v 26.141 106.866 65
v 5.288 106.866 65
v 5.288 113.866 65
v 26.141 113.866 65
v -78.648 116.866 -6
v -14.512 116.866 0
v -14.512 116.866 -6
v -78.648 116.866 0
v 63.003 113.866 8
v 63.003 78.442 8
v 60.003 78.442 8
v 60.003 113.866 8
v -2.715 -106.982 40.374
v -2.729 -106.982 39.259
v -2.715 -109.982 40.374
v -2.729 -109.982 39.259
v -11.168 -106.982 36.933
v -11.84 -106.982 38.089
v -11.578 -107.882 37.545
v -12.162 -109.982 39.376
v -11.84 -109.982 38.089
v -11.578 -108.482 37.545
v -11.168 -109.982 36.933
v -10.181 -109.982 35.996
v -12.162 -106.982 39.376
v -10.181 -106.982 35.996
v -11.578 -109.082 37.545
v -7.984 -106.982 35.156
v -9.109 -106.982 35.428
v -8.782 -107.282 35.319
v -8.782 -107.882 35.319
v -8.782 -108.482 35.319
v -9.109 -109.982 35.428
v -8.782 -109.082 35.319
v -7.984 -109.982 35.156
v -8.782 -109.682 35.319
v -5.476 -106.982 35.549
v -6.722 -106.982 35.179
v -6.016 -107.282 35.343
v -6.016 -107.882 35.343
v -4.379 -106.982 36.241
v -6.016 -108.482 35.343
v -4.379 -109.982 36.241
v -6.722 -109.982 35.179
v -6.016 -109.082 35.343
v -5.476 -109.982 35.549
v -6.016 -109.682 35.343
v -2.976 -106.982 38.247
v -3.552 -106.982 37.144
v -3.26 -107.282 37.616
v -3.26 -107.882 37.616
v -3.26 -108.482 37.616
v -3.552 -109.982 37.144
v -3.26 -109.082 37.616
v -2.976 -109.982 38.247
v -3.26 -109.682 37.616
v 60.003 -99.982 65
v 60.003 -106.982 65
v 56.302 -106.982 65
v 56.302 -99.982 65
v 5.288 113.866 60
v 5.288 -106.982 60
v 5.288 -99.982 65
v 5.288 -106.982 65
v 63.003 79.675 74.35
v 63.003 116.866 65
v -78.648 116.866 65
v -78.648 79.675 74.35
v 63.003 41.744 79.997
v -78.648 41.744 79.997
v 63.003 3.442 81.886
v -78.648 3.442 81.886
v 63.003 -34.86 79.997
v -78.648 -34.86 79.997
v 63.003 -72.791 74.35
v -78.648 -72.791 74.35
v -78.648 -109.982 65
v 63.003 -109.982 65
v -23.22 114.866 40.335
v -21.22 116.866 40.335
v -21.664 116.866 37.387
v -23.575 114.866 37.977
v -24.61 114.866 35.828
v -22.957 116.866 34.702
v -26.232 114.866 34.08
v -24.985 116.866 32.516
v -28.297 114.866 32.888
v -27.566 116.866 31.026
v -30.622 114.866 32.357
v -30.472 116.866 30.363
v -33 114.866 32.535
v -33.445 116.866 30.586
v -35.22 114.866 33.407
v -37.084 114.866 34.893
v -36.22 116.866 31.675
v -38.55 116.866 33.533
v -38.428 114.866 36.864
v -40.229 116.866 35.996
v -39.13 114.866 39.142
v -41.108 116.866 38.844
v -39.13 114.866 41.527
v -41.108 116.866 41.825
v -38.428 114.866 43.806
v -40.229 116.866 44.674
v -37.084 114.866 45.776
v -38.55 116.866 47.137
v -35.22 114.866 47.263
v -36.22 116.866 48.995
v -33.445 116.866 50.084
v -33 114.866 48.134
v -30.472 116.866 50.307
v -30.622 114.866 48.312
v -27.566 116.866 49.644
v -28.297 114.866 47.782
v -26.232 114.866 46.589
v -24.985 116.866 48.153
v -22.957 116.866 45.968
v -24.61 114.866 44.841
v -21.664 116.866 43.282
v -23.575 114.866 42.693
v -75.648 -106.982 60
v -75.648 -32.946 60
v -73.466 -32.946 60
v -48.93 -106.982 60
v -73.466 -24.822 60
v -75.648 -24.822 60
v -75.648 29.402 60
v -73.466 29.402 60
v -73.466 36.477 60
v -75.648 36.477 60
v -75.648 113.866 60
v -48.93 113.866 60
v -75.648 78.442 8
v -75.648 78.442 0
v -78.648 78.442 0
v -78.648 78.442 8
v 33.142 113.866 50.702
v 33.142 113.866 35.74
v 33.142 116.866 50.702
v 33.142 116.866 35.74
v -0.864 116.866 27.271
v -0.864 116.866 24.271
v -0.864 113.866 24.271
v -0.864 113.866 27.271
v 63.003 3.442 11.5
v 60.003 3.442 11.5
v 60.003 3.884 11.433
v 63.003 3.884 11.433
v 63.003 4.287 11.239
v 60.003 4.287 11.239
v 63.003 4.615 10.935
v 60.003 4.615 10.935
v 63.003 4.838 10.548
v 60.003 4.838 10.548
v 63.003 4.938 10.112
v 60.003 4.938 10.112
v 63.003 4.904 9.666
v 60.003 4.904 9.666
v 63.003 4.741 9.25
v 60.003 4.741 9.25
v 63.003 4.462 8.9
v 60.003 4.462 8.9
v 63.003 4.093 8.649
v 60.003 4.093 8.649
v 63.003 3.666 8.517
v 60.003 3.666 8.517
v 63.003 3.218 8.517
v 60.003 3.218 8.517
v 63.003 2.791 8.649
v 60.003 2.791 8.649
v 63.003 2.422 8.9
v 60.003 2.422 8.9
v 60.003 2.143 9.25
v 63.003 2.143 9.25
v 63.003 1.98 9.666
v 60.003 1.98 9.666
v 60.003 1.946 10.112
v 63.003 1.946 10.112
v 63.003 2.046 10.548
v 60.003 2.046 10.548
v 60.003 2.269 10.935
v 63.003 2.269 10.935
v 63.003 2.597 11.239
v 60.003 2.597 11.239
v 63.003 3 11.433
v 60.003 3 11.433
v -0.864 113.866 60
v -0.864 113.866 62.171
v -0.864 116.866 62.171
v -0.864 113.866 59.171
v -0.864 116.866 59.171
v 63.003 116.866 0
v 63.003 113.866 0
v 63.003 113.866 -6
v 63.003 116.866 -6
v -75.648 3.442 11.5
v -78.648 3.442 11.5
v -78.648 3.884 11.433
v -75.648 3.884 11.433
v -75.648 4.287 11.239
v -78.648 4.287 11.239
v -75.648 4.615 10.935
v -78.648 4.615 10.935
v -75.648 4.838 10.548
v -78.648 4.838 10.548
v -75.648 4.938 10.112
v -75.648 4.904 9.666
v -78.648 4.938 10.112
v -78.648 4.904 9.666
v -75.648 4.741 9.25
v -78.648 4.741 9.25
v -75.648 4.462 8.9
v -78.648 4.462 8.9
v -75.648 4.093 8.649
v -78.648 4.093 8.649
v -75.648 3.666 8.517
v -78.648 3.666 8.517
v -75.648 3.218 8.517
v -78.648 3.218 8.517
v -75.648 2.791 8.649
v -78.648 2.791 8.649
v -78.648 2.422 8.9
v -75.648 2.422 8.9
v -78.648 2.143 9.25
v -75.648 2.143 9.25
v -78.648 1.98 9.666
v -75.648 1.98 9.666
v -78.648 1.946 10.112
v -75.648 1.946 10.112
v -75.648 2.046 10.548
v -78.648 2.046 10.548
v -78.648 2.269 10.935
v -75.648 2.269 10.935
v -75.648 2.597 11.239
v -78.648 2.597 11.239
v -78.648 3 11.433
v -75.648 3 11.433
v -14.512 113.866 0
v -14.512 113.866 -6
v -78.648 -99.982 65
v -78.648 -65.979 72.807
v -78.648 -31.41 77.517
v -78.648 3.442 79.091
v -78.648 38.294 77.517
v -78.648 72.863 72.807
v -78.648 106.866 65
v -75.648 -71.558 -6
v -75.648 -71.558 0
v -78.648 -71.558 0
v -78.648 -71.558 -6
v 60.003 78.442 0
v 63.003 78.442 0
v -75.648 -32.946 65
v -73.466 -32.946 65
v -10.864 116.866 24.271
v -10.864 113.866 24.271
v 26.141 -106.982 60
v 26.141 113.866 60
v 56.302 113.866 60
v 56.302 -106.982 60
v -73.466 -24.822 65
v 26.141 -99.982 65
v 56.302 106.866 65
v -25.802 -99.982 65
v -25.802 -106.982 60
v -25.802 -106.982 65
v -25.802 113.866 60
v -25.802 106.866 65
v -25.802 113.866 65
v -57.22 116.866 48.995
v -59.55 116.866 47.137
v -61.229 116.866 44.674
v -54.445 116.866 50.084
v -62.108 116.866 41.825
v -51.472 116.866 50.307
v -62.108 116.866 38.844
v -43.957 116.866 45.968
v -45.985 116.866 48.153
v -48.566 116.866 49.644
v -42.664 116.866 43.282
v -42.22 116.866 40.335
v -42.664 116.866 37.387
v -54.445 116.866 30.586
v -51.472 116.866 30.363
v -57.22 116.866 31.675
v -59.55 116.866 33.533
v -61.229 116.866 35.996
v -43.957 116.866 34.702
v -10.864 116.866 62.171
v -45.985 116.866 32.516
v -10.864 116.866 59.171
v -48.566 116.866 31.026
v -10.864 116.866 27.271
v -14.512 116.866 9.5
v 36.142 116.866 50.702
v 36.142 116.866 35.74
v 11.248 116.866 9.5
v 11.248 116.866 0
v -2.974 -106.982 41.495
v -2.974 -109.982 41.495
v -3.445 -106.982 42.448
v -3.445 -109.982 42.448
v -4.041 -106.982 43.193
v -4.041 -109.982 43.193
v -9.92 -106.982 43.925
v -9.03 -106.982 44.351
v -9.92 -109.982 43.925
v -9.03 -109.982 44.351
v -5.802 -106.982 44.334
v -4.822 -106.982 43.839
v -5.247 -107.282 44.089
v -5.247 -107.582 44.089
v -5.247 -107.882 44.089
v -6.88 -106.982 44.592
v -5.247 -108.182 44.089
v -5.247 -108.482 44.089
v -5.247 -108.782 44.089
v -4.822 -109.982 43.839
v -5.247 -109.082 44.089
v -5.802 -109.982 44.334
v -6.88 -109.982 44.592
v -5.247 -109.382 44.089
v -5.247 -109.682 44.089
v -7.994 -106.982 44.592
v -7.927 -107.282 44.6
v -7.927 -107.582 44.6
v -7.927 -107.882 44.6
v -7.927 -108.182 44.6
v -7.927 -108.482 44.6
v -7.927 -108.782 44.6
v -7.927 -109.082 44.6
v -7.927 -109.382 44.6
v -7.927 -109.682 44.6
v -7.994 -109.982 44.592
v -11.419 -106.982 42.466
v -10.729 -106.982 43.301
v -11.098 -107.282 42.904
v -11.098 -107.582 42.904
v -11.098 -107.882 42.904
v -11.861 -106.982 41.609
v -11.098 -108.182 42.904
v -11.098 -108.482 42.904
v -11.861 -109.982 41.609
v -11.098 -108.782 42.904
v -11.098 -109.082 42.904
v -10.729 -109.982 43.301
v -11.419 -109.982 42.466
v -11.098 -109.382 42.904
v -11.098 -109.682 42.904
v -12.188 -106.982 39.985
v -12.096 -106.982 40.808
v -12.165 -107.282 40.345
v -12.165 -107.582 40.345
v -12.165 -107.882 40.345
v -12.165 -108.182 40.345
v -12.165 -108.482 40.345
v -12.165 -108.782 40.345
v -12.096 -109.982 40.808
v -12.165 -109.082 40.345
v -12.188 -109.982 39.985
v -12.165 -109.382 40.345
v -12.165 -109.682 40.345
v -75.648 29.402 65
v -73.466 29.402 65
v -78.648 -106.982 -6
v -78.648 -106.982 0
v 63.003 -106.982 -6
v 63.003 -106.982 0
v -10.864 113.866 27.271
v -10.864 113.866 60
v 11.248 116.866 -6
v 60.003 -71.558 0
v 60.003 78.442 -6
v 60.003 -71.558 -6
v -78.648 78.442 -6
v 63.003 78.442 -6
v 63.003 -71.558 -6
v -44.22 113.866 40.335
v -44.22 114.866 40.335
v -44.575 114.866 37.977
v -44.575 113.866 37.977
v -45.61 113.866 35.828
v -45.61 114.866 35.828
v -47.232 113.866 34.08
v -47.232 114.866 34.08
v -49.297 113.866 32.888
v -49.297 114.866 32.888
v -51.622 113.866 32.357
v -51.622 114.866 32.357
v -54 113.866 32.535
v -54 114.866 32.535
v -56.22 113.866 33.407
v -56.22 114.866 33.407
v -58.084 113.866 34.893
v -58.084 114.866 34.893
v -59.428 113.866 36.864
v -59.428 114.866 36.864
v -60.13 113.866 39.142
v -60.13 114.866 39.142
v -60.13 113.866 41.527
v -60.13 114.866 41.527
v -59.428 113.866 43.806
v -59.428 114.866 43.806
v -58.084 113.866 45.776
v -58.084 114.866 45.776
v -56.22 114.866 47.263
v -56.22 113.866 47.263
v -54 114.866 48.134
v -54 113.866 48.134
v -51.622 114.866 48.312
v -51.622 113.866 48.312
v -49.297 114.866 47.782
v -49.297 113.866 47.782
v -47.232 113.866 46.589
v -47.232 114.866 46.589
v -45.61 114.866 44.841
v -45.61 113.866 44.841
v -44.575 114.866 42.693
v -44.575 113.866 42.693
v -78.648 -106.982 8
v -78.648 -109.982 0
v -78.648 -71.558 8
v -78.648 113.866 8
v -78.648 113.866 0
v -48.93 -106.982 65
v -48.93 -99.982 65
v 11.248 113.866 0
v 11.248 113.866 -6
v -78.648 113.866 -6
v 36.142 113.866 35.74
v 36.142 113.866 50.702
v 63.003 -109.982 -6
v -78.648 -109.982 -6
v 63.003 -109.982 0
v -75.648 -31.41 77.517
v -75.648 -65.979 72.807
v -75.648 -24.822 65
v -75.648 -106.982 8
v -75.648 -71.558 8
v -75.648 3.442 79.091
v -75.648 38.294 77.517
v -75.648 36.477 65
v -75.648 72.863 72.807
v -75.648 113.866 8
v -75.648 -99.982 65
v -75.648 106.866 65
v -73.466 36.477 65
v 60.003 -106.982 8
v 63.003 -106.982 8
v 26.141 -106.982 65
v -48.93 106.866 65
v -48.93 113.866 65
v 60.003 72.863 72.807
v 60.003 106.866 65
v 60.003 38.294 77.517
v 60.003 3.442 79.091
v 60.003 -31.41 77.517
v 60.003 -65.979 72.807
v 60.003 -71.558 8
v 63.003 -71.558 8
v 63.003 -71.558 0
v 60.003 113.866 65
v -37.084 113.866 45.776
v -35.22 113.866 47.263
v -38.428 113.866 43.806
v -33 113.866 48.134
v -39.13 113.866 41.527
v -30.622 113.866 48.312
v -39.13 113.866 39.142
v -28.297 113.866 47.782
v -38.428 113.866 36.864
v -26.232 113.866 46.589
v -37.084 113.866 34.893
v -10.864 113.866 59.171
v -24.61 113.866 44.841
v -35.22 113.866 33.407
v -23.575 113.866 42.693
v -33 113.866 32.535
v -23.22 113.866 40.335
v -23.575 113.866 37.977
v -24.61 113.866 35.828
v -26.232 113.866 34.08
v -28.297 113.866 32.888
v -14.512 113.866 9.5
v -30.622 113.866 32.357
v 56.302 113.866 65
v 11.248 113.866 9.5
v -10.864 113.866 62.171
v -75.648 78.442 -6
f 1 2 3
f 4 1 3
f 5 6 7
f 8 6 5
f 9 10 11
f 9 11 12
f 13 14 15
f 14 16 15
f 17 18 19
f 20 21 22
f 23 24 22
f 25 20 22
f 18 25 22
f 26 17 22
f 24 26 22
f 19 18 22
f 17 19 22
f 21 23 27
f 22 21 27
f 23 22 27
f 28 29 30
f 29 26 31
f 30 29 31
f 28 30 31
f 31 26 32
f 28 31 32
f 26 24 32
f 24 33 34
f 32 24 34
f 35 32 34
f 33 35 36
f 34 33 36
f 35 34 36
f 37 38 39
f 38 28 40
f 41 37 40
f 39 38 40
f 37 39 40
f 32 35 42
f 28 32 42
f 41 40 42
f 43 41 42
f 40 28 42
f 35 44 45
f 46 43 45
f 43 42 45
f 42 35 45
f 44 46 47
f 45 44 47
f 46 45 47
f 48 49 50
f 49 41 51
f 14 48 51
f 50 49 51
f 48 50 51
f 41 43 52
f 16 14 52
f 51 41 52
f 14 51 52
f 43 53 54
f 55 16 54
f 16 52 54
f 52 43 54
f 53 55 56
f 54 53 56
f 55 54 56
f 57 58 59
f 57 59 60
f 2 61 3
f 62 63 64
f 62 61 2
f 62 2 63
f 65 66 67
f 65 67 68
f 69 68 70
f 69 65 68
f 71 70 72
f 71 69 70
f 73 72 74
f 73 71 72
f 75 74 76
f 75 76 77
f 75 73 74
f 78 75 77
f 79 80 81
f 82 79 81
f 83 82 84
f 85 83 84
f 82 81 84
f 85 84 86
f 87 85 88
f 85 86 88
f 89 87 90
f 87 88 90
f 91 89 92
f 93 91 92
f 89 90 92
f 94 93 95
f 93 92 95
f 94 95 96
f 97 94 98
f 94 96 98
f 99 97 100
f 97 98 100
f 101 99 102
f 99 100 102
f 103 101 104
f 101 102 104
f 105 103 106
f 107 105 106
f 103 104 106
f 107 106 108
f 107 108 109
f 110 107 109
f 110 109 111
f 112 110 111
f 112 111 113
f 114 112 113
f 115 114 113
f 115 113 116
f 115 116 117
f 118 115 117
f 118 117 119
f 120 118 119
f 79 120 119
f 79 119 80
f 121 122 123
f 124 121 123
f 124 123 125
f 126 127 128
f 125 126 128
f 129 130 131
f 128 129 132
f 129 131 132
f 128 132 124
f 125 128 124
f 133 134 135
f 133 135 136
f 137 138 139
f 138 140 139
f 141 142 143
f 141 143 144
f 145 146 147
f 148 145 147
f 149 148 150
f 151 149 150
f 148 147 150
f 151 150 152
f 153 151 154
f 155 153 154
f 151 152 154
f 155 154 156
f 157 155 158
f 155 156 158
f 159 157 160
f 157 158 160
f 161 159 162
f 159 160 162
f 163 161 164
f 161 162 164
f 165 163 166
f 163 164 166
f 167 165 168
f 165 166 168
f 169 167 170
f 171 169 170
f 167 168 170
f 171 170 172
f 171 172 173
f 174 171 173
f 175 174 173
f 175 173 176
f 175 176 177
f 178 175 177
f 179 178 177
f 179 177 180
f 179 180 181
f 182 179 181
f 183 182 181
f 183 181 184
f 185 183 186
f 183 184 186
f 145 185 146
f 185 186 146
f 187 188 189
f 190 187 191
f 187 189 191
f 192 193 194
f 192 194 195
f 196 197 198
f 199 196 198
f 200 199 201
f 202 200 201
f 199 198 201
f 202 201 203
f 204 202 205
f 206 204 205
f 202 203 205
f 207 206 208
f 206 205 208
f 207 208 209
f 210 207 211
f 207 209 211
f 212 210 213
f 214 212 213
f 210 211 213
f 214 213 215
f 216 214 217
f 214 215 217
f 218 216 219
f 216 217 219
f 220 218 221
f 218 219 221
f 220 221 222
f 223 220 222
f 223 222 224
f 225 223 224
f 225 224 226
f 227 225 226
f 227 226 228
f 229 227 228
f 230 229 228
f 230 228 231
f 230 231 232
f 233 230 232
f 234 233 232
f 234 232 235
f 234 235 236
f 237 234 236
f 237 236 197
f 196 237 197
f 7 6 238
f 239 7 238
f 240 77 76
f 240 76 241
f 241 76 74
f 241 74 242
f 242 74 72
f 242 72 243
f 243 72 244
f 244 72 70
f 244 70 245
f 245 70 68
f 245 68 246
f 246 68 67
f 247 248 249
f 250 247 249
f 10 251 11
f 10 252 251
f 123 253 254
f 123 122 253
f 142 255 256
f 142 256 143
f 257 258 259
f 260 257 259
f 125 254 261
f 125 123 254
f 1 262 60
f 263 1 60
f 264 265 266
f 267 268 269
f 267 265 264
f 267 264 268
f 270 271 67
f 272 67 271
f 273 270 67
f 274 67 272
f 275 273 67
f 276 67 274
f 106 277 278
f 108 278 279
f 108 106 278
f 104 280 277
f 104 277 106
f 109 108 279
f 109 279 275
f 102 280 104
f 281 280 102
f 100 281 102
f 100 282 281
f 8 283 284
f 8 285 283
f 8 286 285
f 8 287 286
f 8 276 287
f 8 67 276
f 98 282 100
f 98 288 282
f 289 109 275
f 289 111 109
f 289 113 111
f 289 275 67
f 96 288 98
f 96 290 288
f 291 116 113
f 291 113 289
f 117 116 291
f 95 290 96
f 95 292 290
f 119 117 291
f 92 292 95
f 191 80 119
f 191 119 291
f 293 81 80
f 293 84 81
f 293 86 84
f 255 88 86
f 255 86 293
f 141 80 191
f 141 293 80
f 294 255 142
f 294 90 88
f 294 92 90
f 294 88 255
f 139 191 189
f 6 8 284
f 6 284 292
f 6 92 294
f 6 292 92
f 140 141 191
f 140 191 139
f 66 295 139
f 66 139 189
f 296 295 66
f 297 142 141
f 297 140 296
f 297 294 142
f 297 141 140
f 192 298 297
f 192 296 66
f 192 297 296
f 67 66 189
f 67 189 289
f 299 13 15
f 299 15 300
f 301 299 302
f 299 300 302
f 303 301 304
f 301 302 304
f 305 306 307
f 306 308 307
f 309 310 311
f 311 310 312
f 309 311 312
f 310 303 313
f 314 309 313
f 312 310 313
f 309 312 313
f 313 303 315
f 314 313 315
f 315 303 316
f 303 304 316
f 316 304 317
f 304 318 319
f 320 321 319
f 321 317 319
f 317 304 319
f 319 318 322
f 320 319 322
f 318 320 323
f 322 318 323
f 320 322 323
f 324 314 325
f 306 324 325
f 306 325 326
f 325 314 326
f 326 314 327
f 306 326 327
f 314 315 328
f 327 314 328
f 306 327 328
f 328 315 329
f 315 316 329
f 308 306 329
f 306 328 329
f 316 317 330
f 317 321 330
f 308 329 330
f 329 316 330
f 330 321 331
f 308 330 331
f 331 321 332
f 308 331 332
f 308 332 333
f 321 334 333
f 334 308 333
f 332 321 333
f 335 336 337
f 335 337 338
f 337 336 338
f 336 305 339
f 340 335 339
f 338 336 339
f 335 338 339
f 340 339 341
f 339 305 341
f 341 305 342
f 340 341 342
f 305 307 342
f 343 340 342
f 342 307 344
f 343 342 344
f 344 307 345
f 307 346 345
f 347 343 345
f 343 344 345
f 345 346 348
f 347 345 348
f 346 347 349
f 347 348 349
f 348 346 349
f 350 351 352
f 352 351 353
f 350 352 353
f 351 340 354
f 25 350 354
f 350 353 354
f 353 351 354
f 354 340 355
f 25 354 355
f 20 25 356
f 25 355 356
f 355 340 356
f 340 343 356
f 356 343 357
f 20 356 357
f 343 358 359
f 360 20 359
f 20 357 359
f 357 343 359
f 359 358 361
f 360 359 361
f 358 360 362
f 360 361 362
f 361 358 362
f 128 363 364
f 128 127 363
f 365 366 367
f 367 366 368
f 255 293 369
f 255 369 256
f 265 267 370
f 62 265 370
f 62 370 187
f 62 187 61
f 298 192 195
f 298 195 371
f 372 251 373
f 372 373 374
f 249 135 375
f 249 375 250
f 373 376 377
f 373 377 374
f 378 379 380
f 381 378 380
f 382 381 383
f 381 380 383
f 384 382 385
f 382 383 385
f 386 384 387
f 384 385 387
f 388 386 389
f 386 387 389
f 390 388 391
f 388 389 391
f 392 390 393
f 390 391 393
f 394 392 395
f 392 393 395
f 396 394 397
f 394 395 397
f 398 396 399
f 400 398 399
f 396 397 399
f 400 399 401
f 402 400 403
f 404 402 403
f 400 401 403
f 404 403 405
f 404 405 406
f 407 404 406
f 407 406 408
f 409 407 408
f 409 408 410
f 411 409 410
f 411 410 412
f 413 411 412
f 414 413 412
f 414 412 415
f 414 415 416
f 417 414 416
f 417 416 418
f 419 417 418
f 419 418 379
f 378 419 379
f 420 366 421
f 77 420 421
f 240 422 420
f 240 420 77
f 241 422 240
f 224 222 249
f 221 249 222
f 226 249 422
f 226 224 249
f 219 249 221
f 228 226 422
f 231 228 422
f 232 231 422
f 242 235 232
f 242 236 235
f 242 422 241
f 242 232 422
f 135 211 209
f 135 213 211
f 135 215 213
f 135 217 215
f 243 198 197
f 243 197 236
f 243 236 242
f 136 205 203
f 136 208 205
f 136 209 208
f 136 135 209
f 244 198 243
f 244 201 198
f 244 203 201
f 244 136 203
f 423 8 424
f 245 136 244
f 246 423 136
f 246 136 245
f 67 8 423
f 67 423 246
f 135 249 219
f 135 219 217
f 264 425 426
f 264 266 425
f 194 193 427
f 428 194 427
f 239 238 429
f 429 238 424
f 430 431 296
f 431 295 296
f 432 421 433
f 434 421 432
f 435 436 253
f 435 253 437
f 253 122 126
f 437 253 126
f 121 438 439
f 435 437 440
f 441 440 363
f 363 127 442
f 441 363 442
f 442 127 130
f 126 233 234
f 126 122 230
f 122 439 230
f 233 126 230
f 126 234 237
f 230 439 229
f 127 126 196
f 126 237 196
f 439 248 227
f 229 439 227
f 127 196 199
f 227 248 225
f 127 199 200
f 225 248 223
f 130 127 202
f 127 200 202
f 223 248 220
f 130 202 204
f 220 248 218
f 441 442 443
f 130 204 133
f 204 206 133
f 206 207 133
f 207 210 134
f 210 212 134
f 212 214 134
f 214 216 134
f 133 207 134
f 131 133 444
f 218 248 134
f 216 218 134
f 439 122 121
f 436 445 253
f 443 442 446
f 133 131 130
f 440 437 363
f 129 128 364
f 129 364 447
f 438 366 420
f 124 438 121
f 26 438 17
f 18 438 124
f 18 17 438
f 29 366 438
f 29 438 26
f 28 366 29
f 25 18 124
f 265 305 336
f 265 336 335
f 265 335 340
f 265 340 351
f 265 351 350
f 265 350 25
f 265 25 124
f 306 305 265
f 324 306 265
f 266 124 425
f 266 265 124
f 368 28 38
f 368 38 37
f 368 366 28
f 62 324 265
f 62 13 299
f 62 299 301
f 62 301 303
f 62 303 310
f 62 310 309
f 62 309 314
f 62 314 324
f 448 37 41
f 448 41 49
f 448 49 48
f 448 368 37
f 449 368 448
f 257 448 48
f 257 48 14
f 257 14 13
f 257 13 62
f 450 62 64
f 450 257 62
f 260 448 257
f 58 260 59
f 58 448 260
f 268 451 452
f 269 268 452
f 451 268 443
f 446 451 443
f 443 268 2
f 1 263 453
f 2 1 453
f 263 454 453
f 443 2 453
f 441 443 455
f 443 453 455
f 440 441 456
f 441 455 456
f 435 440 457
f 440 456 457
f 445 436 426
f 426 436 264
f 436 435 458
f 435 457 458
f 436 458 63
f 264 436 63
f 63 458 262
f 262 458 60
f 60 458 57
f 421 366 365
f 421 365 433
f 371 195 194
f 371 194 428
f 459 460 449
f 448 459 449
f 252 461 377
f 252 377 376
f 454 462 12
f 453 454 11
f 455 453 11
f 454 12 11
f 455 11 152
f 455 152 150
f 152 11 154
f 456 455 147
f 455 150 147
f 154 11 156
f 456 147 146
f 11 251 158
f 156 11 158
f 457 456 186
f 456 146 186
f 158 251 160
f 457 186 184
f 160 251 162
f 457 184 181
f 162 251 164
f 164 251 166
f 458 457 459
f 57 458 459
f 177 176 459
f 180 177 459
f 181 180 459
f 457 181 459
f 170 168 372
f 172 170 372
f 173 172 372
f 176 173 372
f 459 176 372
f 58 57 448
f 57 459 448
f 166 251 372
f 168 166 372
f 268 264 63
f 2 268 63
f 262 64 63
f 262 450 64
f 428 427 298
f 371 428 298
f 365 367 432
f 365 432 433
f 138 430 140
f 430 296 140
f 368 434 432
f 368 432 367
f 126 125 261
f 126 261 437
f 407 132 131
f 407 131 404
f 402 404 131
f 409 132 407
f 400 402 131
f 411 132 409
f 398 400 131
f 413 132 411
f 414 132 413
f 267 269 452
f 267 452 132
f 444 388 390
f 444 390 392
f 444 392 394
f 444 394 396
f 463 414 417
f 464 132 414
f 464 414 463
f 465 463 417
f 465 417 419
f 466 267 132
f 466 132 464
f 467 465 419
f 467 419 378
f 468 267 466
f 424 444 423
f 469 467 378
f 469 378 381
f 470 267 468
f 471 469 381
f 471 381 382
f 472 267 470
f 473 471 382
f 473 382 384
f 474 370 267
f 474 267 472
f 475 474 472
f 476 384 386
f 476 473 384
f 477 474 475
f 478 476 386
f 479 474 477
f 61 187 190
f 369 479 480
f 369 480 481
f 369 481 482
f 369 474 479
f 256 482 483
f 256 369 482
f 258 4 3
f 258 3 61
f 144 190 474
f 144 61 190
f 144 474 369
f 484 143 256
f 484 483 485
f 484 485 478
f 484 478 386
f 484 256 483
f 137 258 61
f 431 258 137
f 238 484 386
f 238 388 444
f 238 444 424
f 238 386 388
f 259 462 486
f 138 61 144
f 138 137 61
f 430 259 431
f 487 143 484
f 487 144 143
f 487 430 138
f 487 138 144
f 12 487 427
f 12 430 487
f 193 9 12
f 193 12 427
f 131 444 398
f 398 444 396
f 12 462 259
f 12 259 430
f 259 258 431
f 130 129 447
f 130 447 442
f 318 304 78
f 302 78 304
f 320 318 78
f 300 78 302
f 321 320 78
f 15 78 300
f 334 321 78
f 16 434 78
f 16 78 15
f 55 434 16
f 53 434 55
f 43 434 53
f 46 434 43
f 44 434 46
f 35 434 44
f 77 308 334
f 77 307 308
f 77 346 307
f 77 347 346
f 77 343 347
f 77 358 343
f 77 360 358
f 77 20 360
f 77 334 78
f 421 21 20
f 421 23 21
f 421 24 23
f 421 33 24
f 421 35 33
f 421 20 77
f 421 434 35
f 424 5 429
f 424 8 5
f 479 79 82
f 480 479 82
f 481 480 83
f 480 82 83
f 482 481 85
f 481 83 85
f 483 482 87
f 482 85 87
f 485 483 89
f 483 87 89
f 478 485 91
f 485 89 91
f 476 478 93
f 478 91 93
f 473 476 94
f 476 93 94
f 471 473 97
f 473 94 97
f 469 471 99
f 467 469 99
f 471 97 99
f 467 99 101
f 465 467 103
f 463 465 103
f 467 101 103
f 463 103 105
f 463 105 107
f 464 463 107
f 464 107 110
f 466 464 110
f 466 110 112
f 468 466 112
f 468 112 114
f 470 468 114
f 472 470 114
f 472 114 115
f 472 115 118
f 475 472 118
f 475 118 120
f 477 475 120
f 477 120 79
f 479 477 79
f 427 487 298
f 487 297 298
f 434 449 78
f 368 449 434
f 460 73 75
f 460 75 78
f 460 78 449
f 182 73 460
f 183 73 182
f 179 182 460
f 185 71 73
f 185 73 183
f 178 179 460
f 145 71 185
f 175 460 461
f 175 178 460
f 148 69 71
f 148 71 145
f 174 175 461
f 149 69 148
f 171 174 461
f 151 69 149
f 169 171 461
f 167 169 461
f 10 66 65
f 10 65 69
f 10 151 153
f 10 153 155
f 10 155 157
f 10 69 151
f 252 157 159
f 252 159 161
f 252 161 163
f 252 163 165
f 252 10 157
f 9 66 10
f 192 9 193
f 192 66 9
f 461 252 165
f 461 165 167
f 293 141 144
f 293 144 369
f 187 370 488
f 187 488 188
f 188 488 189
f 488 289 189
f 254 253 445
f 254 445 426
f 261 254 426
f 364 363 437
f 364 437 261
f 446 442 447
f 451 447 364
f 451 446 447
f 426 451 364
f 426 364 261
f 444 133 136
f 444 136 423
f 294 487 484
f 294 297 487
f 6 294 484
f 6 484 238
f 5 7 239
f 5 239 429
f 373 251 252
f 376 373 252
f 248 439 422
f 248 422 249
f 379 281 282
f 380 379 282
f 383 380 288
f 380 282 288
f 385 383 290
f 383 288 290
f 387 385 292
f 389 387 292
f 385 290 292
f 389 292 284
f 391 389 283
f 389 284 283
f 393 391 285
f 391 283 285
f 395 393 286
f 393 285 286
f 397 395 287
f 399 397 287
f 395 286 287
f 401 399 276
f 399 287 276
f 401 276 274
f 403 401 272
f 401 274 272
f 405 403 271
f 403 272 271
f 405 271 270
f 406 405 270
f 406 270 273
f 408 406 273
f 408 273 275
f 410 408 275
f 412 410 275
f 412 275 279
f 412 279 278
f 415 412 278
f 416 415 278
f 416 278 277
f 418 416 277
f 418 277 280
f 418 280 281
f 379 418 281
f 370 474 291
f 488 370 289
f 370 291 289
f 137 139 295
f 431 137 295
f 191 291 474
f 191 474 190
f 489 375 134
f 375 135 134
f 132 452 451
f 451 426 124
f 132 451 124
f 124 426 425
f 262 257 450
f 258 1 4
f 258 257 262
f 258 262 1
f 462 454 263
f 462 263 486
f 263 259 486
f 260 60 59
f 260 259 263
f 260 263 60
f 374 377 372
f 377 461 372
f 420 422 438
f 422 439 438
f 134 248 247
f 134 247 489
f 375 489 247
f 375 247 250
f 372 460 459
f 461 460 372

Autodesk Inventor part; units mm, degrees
ref_plane "YZ Plane" through (0, 0, 0) normal (1, 0, 0) x (0, 1, 0)
ref_plane "XZ Plane" through (0, 0, 0) normal (0, 1, 0) x (-1, 0, 0)
ref_plane "XY Plane" through (0, 0, 0) normal (0, 0, 1) x (1, 0, 0)
sketch "Эскиз1" plane through (0, 0, 0) normal (0, 0, 1) x (1, 0, 0)
  line L0 (-75.6484, -106.9824) -> (60.0028, -106.9824) projected
  line L1 (60.0028, 113.8664) -> (-75.6484, 113.8664) projected
  line L2 (-75.6484, -71.558) -> (-75.6484, 58.442) projected
  line L3 (60.0028, -71.558) -> (60.0028, 78.442) projected
  line L4 (63.0028, -109.9824) -> (-78.6484, -109.9824)
  line L5 (-78.6484, -109.9824) -> (-78.6484, 116.8664)
  line L6 (-78.6484, 116.8664) -> (63.0028, 116.8664)
  line L7 (63.0028, 116.8664) -> (63.0028, -109.9824)
  line L8 (60.0028, -106.9824) -> (-75.6484, -106.9824)
  line L9 (-75.6484, -106.9824) -> (-75.6484, 113.8664)
  line L10 (-75.6484, 113.8664) -> (60.0028, 113.8664)
  line L11 (60.0028, 113.8664) -> (60.0028, -106.9824)
  point P0 (0, 0)
  dimension "d0" = 3
  dimension "d1" = 3
  dimension "d2" = 3
  dimension "d3" = 3
extrude "Выдавливание1" add sketch "Эскиз1" along normal blind 60
sketch "Эскиз2" plane through (63.0028, -109.9824, 0) normal (1, 0, 0) x (0, 0, -1)
  point P0 (0, 109.9824)
sketch "Эскиз3" plane through (0, 0, 0) normal (0, 0, -1) x (-1, 0, 0)
  point P0 (0, 0)
sketch "Эскиз4" plane through (63.0028, -109.9824, 0) normal (1, 0, 0) x (0, 0, -1)
  line L0 (-8, 38.4244) -> (-8, 3) projected
  line L1 (-8, 3) -> (-8, 38.4244) projected
  line L2 (0.0001, 223.8488) -> (0, 188.4244) projected
  line L3 (-8, 188.4244) -> (-7.9999, 223.8488) projected
  line L4 (0, 223.8488) -> (0, 3) projected
  line L5 (-8, 38.4244) -> (0, 38.4244)
  line L6 (0, 38.4244) -> (0, 3)
  line L7 (0, 3) -> (-8, 3)
  line L8 (-8, 3) -> (-8, 38.4244)
  line L9 (-7.9999, 223.8488) -> (0, 223.8488)
  line L10 (0, 223.8488) -> (0, 188.4244)
  line L11 (0, 188.4244) -> (-7.9999, 188.4244)
  line L12 (-7.9999, 188.4244) -> (-7.9999, 223.8488)
  point P0 (0, 109.9824)
extrude "Выдавливание2" cut sketch "Эскиз4" against normal blind 239.25
sketch "Эскиз5" plane through (0, 0, 60) normal (0, 0, 1) x (1, 0, 0)
  line L0 (73.8028, -108.2777) -> (32.8028, -108.2777)
  line L1 (63.0028, 116.8664) -> (-78.6484, 116.8664) projected
  line L2 (-78.6484, 116.8664) -> (-78.6484, -109.9824) projected
  line L3 (-78.6484, -109.9824) -> (63.0028, -109.9824) projected
  line L4 (63.0028, -109.9824) -> (63.0028, 116.8664) projected
  line L5 (60.0028, 113.8664) -> (60.0028, -106.9824) projected
  line L6 (60.0028, -106.9824) -> (-75.6484, -106.9824) projected
  line L7 (-75.6484, -106.9824) -> (-75.6484, 113.8664) projected
  line L8 (-75.6484, 113.8664) -> (60.0028, 113.8664) projected
  line L9 (60.0028, -106.9824) -> (-75.6484, -106.9824) projected
  line L10 (-75.6484, 113.8664) -> (60.0028, 113.8664) projected
  line L11 (56.3016, -106.9824) -> (26.1407, -106.9824)
  line L12 (26.1407, -106.9824) -> (26.1407, 113.8664)
  line L13 (26.1407, 113.8664) -> (56.3016, 113.8664)
  line L14 (56.3016, 113.8664) -> (56.3016, -106.9824)
  line L15 (5.2877, -106.9824) -> (-25.8022, -106.9824)
  line L16 (-25.8022, -106.9824) -> (-25.8022, 113.8664)
  line L17 (-25.8022, 113.8664) -> (5.2877, 113.8664)
  line L18 (5.2877, 113.8664) -> (5.2877, -106.9824)
  line L19 (-48.9301, -106.9824) -> (-75.6484, -106.9824)
  line L20 (-75.6484, -106.9824) -> (-75.6484, 111.5008)
  line L21 (-75.6484, 111.5008) -> (-48.9301, 111.5008)
  line L22 (-48.9301, 111.5008) -> (-48.9301, -106.9824)
  line L23 (-75.6484, -106.9824) -> (-75.6484, 113.8664) projected
  line L24 (-75.6484, -32.9455) -> (-73.4662, -32.9455)
  line L25 (-73.4662, -32.9455) -> (-73.4662, -24.8216)
  line L26 (-73.4662, -24.8216) -> (-75.6484, -24.8216)
  line L27 (-75.6484, -24.8216) -> (-75.6484, -32.9455)
  line L28 (-75.6484, 29.4025) -> (-73.4662, 29.4025)
  line L29 (-73.4662, 29.4025) -> (-73.4662, 36.4767)
  line L30 (-73.4662, 36.4767) -> (-75.6484, 36.4767)
  line L31 (-75.6484, 36.4767) -> (-75.6484, 29.4025)
  point P0 (0, 0)
extrude "Выдавливание3" add sketch "Эскиз5" along normal blind 5 contours L4 L3 L2 L1 | L14 L6 L12 L8 | L18 L6 L16 L8 | L6 L7 L24 L25 L26 L28 L29 L30 L21 L22
sketch "Эскиз6" plane through (0, 0, 65) normal (0, 0, 1) x (1, 0, 0)
  line L0 (-48.9301, 111.5008) -> (-75.6484, 111.5008) projected
  line L1 (-75.6484, 111.5008) -> (-75.6484, 113.8664) projected
  line L2 (-48.9301, 111.5008) -> (-75.6484, 111.5008)
  line L3 (-75.6484, 111.5008) -> (-75.6484, 113.8664)
  line L4 (-75.6484, 113.8664) -> (-48.9301, 113.8664)
  line L5 (-48.9301, 113.8664) -> (-48.9301, 111.5008)
  point P0 (0, 0)
extrude "Выдавливание4" add sketch "Эскиз6" against normal blind 5
sketch "Эскиз7" plane through (-78.6484, -71.558, 0) normal (-1, 0, 0) x (0, 0, 1)
  point P0 (0, 71.558)
sketch "Эскиз8" plane through (-78.6484, 116.8664, 0) normal (0, 1, 0) x (1, 0, 0)
  line L0 (85.4799, -9.5) -> (62.4799, -9.5) projected
  line L1 (74.1362, -4.2225) -> (79.8964, -4.2225) projected
  line L2 (141.6512, 0) -> (0, 0) projected
  line L3 (85.4799, -9.5) -> (64.1362, -9.5)
  line L4 (64.1362, -9.5) -> (64.1362, 0)
  line L5 (64.1362, 0) -> (85.4799, 0)
  line L6 (85.4799, 0) -> (85.4799, -9.5)
  line L7 (64.1362, -9.5) -> (89.8964, -9.5)
  line L8 (89.8964, -9.5) -> (89.8964, 0)
  line L9 (89.8964, 0) -> (64.1362, 0)
  line L10 (64.1362, 0) -> (64.1362, -9.5)
  point P0 (78.6484, 0)
  dimension "d12" = 10
  dimension "d13" = 5.584
  dimension "d14" = 10
extrude "Выдавливание5" cut sketch "Эскиз8" against normal blind 5
sketch "Эскиз9" plane through (63.0028, -71.558, 0) normal (1, 0, 0) x (0, 0, -1)
  line L0 (-65, -38.4244) -> (-65, 188.4244) projected
  arc A0 (-65, 188.4244) -> (-65, -38.4244) centre (307.5062, 75) ccw
  line L1 (0, -38.4244) -> (-65, -38.4244) projected
  line L2 (-65, -38.4244) -> (-65, -28.4244)
  line L3 (-65, -28.4244) -> (-65, 178.4244)
  arc A1 (-65, 178.4244) -> (-65, -28.4244) centre (307.5062, 75) ccw
  point P0 (0, 71.558)
  dimension "d17" = 10
  dimension "d18" = 10
extrude "Выдавливание6" add sketch "Эскиз9" against normal blind 141.651 contours A0 L0 A1
sketch "Эскиз10" plane through (63.0028, -71.558, 0) normal (1, 0, 0) x (0, 0, -1)
  arc A0 (-65, 178.4244) -> (-65, -28.4244) centre (307.5062, 75) ccw projected
  line L0 (-65, -28.4244) -> (-65, 178.4244) projected
  point P0 (0, 71.558)
extrude "Выдавливание7" add sketch "Эскиз10" against normal blind 3
sketch "Эскиз11" plane through (-78.6484, -71.558, 0) normal (-1, 0, 0) x (0, 0, 1)
  arc A0 (65, -28.4244) -> (65, 178.4244) centre (-307.5062, 75) ccw projected
  line L0 (65, 188.4244) -> (65, -38.4244) projected
  point P0 (0, 71.558)
extrude "Выдавливание8" add sketch "Эскиз11" against normal blind 3
sketch "Эскиз12" plane through (-78.6484, -109.9824, 0) normal (0, -1, 0) x (1, 0, 0)
  spline S0 degree 3 poles (75.9334, 40.3738) (75.8831, 40.8501) (75.7622, 41.3112) (75.3324, 42.3118) (75.0359, 42.7084) (74.4654, 43.3771) (73.9913, 43.782) (72.8589, 44.371) (72.2642, 44.5465) (71.3446, 44.633) (71.0335, 44.6318) (70.0476, 44.5299) (69.4546, 44.3267) (68.4476, 43.7801) (67.9673, 43.407) (67.0987, 42.3576) (66.8298, 41.785) (66.5793, 40.9818) (66.515, 40.667) (66.4421, 39.9332) (66.4622, 39.6005) (66.486, 39.3756) knots -0.649055 -0.649055 -0.649055 -0.649055 -0.611574 -0.611574 -0.563504 -0.563504 -0.482019 -0.482019 -0.407033 -0.407033 -0.368981 -0.368981 -0.286973 -0.286973 -0.207347 -0.207347 -0.121004 -0.121004 -0.067856 -0.067856 0 0 0 0 projected
  spline S1 degree 3 poles (66.486, 39.3756) (66.5097, 39.1507) (66.5596, 38.8211) (66.7843, 38.1188) (66.913, 37.8244) (67.3257, 37.0912) (67.7084, 36.5875) (68.7772, 35.7428) (69.3247, 35.4783) (70.4238, 35.1543) (71.0461, 35.0795) (72.0316, 35.1858) (72.3361, 35.2497) (73.2173, 35.5265) (73.7622, 35.8224) (74.7465, 36.635) (75.1255, 37.13) (75.5436, 37.9033) (75.7507, 38.353) (75.9619, 39.4214) (75.9837, 39.8976) (75.9334, 40.3738) knots -2.488 -2.488 -2.488 -2.488 -2.22789 -2.22789 -2.024159 -2.024159 -1.693184 -1.693184 -1.387958 -1.387958 -1.073596 -1.073596 -0.927734 -0.927734 -0.640291 -0.640291 -0.327938 -0.327938 -0.143673 -0.143673 0 0 0 0 projected
  point P0 (78.6484, 0)
extrude "Выдавливание9" cut sketch "Эскиз12" against normal blind 3
sketch "Эскиз13" plane through (-78.6484, 116.8664, 65) normal (0, 1, 0) x (1, 0, 0)
  line L0 (49.8619, 5.8292) -> (89.8619, 5.8292) projected
  line L1 (89.8619, 37.7292) -> (49.8619, 37.7292) projected
  line L2 (101.9119, 18.2982) -> (101.9119, 14.2982) projected
  line L3 (101.9119, 29.2602) -> (101.9119, 25.2602) projected
  line L4 (77.7841, 5.8292) -> (67.7841, 5.8292)
  line L5 (67.7841, 5.8292) -> (67.7841, 2.8292)
  line L6 (67.7841, 2.8292) -> (77.7841, 2.8292)
  line L7 (77.7841, 2.8292) -> (77.7841, 5.8292)
  line L8 (77.7841, 37.7292) -> (67.7841, 37.7292)
  line L9 (67.7841, 37.7292) -> (67.7841, 40.7292)
  line L10 (67.7841, 40.7292) -> (77.7841, 40.7292)
  line L11 (77.7841, 40.7292) -> (77.7841, 37.7292)
  line L12 (111.7909, 14.2982) -> (114.7909, 14.2982)
  line L13 (114.7909, 14.2982) -> (114.7909, 29.2602)
  line L14 (114.7909, 29.2602) -> (111.7909, 29.2602)
  line L15 (111.7909, 29.2602) -> (111.7909, 14.2982)
  point P0 (78.6484, 65)
  point P1 (67.7841, 5.8292)
  dimension "d27" = 10
  dimension "d28" = 3
  dimension "d29" = 3
  dimension "d30" = 3
extrude "Выдавливание10" cut sketch "Эскиз13" against normal blind 3
sketch "Эскиз14" plane through (-78.6484, 116.8664, 65) normal (0, 1, 0) x (1, 0, 0)
  circle A0 centre (26.4286, 24.6652) radius 8
  circle A1 centre (47.4286, 24.6652) radius 8
  point P0 (78.6484, 65)
  dimension "d33" = 16
  dimension "d45" = 16
  dimension "d46" = 21
extrude "Выдавливание11" cut sketch "Эскиз14" against normal blind 3
chamfer "Фаска1" distance 2 angle 45 1 edges at (-60.2198, 116.8664, 40.3348)
sketch "Эскиз15" plane through (-78.6484, -71.558, 0) normal (-1, 0, 0) x (0, 0, 1)
  line L0 (-6, 73) -> (-6, 77) projected
  line L1 (-6, 73) -> (-6, 77) projected
  circle A0 centre (10, 75) radius 1.5
  line L2 (0, 150) -> (0, 0) projected
  point P0 (0, 71.558)
  dimension "d39" = 3
  dimension "d40" = 10
extrude "Выдавливание12" cut sketch "Эскиз15" against normal blind 560
sketch "Эскиз16" plane through (0, 0, 0) normal (0, 0, -1) x (-1, 0, 0)
  line L0 (75.6484, -71.558) -> (78.6484, -71.558) projected
  line L1 (78.6484, 78.442) -> (78.6484, -71.558) projected
  line L2 (78.6484, 78.442) -> (75.6484, 78.442) projected
  line L3 (75.6484, -71.558) -> (75.6484, 78.442) projected
  line L4 (-63.0028, -71.558) -> (-60.0028, -71.558) projected
  line L5 (-60.0028, 78.442) -> (-60.0028, -71.558) projected
  line L6 (-60.0028, 78.442) -> (-63.0028, 78.442) projected
  line L7 (-63.0028, -71.558) -> (-63.0028, 78.442) projected
  line L8 (78.6484, -106.9824) -> (-63.0028, -106.9824) projected
  line L9 (-63.0028, -109.9824) -> (-63.0028, -106.9824) projected
  line L10 (78.6484, -109.9824) -> (-63.0028, -109.9824) projected
  line L11 (78.6484, -106.9824) -> (78.6484, -109.9824) projected
  line L12 (-11.248, 113.8664) -> (-11.248, 116.8664) projected
  line L13 (-63.0028, 116.8664) -> (-11.248, 116.8664) projected
  line L14 (-63.0028, 113.8664) -> (-63.0028, 116.8664) projected
  line L15 (-63.0028, 113.8664) -> (-11.248, 113.8664) projected
  line L16 (14.5122, 116.8664) -> (14.5122, 113.8664) projected
  line L17 (14.5122, 113.8664) -> (78.6484, 113.8664) projected
  line L18 (78.6484, 116.8664) -> (78.6484, 113.8664) projected
  line L19 (14.5122, 116.8664) -> (78.6484, 116.8664) projected
  point P0 (0, 0)
extrude "Выдавливание13" add sketch "Эскиз16" along normal blind 6
chamfer "Фаска2" distance 2 angle 45 1 edges at (-39.2198, 116.8664, 40.3348)
equation "\"d2\" = d1"
equation "\"d3\" = d0"
properties part number "3Dkrish"
